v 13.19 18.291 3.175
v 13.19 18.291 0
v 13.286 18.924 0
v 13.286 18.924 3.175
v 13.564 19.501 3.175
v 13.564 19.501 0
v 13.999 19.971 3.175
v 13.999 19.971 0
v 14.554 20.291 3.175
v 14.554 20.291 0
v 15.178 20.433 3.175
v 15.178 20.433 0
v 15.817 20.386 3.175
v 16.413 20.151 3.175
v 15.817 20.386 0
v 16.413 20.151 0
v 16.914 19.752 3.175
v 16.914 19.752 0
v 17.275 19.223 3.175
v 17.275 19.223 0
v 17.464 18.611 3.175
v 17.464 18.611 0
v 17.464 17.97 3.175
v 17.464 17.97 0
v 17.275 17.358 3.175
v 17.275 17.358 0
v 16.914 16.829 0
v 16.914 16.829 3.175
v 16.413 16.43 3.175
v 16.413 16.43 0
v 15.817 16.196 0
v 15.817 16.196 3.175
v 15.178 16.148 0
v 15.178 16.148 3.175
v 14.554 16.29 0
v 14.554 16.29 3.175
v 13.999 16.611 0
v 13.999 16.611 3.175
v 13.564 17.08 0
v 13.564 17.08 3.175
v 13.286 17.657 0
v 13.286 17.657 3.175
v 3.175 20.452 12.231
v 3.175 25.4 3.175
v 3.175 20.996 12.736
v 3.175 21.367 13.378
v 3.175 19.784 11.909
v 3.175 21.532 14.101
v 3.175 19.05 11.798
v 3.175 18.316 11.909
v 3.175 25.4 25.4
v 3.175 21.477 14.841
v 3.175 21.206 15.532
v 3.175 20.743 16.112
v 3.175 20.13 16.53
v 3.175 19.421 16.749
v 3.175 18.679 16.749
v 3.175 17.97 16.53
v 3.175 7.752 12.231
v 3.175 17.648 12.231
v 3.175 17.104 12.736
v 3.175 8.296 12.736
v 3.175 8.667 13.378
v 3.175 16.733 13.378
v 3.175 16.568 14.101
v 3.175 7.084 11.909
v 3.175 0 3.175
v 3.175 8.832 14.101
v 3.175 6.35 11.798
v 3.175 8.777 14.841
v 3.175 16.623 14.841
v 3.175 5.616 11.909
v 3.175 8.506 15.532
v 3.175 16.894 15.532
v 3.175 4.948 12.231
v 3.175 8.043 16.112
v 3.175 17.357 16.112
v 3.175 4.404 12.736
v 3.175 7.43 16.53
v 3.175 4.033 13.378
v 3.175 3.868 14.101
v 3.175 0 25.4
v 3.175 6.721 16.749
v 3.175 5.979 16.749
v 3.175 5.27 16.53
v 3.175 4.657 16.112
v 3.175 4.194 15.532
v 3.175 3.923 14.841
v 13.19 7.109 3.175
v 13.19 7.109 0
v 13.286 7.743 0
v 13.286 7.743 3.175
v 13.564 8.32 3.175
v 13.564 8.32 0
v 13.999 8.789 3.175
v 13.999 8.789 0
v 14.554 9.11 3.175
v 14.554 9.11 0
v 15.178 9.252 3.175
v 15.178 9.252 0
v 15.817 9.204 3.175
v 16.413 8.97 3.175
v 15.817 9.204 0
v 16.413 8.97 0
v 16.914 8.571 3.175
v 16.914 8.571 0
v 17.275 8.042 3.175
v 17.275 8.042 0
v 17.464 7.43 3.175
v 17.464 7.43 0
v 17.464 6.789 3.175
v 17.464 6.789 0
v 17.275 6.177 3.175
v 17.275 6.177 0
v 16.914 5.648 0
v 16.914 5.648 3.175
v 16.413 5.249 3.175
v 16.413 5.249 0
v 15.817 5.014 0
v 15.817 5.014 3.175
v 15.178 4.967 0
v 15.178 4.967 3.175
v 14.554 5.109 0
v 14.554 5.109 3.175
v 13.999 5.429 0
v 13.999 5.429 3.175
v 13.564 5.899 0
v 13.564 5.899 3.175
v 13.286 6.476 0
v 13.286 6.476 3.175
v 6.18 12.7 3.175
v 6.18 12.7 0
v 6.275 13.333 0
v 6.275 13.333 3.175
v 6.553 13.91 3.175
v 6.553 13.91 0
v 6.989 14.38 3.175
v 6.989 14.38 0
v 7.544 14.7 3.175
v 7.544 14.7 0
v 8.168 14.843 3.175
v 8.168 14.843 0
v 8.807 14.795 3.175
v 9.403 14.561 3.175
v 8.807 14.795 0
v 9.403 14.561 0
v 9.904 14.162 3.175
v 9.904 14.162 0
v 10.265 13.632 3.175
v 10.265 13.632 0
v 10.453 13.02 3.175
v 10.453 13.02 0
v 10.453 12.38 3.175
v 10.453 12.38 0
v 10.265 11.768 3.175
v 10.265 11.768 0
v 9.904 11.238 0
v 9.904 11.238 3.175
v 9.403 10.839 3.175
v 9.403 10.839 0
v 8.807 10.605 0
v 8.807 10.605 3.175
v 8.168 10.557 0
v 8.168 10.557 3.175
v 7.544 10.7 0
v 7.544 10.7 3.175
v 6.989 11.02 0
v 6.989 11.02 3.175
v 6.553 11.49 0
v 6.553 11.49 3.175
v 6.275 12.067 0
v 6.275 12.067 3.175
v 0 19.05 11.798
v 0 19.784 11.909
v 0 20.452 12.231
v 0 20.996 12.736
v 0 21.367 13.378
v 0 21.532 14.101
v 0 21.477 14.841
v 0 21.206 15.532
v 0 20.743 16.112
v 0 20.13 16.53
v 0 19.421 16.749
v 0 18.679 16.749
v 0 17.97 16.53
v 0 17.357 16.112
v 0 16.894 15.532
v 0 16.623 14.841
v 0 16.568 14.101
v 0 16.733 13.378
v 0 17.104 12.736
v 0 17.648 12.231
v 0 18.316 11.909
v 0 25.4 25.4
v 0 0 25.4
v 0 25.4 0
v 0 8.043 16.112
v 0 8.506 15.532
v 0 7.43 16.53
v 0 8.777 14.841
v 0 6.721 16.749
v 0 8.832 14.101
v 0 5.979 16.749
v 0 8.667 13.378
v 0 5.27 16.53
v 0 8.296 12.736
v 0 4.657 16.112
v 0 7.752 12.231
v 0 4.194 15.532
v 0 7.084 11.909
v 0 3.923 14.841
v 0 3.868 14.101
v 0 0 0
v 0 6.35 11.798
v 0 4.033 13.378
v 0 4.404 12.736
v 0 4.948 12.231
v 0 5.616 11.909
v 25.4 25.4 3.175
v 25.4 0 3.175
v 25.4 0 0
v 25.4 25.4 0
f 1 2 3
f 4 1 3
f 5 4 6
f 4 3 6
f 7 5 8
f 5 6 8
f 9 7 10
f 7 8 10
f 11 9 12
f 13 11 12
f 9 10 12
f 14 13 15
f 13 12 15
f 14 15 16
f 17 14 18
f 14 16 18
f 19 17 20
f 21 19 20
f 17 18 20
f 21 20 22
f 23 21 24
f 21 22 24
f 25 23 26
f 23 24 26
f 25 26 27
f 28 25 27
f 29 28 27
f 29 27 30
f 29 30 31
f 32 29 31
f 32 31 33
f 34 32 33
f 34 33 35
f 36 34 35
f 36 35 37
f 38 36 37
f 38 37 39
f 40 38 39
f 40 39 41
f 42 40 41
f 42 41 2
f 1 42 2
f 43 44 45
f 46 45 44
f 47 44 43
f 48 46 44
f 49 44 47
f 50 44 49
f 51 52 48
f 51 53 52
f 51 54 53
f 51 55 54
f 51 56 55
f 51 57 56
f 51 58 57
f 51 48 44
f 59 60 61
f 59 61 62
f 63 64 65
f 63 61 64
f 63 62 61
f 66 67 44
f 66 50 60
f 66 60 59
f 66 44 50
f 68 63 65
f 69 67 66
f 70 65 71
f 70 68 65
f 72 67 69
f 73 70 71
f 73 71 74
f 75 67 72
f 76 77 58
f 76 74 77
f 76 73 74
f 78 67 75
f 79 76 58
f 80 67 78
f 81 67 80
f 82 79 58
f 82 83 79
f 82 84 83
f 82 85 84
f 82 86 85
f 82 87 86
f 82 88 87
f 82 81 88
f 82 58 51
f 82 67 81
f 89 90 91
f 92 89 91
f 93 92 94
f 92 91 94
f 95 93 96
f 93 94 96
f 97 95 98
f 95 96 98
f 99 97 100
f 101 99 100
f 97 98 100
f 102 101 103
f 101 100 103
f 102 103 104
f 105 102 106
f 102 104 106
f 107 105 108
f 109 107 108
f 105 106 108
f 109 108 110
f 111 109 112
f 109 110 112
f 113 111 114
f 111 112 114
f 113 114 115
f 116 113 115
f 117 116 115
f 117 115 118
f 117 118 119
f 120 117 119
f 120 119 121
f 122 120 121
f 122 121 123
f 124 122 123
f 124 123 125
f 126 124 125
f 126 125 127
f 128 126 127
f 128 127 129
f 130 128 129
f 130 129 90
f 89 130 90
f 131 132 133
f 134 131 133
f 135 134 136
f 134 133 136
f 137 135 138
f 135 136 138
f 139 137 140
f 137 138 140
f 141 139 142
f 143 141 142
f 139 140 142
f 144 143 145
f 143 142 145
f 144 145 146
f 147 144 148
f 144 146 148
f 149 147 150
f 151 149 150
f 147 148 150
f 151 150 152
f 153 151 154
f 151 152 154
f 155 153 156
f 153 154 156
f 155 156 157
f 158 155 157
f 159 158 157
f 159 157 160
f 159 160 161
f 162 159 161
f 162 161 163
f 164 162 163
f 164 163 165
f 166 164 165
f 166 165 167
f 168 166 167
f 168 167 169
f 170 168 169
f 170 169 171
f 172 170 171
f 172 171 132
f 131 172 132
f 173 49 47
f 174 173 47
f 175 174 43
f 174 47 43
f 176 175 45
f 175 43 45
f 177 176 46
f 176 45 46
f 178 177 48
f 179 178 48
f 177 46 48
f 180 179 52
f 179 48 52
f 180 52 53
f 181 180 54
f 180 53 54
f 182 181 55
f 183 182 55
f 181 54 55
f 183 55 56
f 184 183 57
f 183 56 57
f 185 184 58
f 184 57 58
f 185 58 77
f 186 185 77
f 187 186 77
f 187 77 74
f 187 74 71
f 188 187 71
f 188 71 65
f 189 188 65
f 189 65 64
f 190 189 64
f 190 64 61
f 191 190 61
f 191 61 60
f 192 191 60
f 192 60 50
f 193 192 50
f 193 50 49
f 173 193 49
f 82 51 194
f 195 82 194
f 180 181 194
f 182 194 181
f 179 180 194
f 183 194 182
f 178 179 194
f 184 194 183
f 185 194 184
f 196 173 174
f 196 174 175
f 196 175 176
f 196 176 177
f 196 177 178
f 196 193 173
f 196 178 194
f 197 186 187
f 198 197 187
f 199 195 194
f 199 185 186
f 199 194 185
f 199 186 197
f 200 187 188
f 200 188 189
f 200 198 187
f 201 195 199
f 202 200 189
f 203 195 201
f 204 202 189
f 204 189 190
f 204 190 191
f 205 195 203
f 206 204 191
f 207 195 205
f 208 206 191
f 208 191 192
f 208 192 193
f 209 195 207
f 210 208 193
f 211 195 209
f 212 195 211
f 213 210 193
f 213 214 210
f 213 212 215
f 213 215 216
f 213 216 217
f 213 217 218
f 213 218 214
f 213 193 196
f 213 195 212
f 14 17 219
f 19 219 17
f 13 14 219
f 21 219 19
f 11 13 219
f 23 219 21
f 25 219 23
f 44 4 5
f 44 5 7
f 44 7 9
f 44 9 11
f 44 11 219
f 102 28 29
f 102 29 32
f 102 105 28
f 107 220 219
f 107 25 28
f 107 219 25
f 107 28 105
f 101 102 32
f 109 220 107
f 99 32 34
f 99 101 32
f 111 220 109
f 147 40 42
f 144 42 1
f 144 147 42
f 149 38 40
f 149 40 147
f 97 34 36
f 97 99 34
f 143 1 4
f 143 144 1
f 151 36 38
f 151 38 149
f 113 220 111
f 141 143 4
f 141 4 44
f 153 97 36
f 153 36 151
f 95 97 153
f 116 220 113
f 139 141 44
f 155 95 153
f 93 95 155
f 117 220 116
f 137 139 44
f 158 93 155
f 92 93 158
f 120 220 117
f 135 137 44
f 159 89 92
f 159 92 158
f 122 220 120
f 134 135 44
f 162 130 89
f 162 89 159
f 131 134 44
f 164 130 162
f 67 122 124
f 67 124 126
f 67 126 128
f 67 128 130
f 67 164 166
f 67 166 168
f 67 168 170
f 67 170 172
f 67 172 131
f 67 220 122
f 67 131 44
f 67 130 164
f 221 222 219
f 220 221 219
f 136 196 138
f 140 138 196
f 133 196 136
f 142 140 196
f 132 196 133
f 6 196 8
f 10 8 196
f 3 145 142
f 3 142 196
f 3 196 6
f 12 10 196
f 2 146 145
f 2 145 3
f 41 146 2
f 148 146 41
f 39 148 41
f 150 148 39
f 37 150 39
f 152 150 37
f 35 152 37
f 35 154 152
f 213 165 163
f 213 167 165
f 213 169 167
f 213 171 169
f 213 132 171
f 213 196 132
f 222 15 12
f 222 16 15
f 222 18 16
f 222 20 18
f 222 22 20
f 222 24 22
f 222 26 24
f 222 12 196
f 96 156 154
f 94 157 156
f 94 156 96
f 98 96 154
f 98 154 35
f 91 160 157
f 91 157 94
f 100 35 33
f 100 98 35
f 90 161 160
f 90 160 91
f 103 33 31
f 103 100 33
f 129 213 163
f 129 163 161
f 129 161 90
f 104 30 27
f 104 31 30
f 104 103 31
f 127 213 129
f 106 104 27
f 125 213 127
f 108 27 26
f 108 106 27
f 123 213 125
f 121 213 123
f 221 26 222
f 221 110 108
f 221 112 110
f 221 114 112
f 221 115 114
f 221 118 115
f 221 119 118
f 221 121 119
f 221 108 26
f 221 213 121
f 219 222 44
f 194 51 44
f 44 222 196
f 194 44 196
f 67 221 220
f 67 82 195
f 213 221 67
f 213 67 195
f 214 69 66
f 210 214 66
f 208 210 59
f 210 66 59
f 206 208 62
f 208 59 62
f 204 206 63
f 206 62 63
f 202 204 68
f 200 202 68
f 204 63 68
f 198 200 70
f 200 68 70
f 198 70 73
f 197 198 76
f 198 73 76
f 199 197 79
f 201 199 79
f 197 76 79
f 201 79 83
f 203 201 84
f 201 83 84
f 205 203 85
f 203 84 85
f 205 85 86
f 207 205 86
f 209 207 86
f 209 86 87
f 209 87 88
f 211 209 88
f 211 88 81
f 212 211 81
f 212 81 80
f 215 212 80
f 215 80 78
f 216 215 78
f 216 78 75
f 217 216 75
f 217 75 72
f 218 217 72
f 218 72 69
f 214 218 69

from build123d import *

# Parameters (mm, degrees)
EXTRUDE_THIN1_DEPTH = 25.4
SKETCH3_R           = 2.14884
CUT_EXTRUDE1_DEPTH  = 26.4
SKETCH4_R           = 2.4892
CUT_EXTRUDE2_DEPTH  = 4.175


with BuildPart() as part:
    # Sketch1 → Extrude-Thin1 (new body)
    with BuildSketch(Plane(origin=(0, 0, 0), x_dir=(1, 0, 0), z_dir=(0, 1, 0))):
        Polygon((0, -25.4), (0, 0), (25.4, 0), (25.4, -3.175), (3.175, -3.175), (3.175, -25.4), align=None)
    extrude(amount=EXTRUDE_THIN1_DEPTH)

    # Sketch3 → Cut-Extrude1 (cut, through all)
    with BuildSketch(Plane(origin=(0, 0, 0), x_dir=(-1, 0, 0), z_dir=(0, 0, -1))):
        with Locations((-8.32866, 12.7)):
            Circle(SKETCH3_R)
        with Locations((-15.33906, 7.10946)):
            Circle(SKETCH3_R)
        with Locations((-15.33906, 18.29054)):
            Circle(SKETCH3_R)
    extrude(amount=-CUT_EXTRUDE1_DEPTH, mode=Mode.SUBTRACT)

    # Sketch4 → Cut-Extrude2 (cut, through all)
    with BuildSketch(Plane(origin=(3.175, 0, 0), x_dir=(0, 0, -1), z_dir=(1, 0, 0))):
        with Locations((-14.2875, 6.35)):
            Circle(SKETCH4_R)
        with Locations((-14.2875, 19.05)):
            Circle(SKETCH4_R)
    extrude(amount=-CUT_EXTRUDE2_DEPTH, mode=Mode.SUBTRACT)


solid = part.part
